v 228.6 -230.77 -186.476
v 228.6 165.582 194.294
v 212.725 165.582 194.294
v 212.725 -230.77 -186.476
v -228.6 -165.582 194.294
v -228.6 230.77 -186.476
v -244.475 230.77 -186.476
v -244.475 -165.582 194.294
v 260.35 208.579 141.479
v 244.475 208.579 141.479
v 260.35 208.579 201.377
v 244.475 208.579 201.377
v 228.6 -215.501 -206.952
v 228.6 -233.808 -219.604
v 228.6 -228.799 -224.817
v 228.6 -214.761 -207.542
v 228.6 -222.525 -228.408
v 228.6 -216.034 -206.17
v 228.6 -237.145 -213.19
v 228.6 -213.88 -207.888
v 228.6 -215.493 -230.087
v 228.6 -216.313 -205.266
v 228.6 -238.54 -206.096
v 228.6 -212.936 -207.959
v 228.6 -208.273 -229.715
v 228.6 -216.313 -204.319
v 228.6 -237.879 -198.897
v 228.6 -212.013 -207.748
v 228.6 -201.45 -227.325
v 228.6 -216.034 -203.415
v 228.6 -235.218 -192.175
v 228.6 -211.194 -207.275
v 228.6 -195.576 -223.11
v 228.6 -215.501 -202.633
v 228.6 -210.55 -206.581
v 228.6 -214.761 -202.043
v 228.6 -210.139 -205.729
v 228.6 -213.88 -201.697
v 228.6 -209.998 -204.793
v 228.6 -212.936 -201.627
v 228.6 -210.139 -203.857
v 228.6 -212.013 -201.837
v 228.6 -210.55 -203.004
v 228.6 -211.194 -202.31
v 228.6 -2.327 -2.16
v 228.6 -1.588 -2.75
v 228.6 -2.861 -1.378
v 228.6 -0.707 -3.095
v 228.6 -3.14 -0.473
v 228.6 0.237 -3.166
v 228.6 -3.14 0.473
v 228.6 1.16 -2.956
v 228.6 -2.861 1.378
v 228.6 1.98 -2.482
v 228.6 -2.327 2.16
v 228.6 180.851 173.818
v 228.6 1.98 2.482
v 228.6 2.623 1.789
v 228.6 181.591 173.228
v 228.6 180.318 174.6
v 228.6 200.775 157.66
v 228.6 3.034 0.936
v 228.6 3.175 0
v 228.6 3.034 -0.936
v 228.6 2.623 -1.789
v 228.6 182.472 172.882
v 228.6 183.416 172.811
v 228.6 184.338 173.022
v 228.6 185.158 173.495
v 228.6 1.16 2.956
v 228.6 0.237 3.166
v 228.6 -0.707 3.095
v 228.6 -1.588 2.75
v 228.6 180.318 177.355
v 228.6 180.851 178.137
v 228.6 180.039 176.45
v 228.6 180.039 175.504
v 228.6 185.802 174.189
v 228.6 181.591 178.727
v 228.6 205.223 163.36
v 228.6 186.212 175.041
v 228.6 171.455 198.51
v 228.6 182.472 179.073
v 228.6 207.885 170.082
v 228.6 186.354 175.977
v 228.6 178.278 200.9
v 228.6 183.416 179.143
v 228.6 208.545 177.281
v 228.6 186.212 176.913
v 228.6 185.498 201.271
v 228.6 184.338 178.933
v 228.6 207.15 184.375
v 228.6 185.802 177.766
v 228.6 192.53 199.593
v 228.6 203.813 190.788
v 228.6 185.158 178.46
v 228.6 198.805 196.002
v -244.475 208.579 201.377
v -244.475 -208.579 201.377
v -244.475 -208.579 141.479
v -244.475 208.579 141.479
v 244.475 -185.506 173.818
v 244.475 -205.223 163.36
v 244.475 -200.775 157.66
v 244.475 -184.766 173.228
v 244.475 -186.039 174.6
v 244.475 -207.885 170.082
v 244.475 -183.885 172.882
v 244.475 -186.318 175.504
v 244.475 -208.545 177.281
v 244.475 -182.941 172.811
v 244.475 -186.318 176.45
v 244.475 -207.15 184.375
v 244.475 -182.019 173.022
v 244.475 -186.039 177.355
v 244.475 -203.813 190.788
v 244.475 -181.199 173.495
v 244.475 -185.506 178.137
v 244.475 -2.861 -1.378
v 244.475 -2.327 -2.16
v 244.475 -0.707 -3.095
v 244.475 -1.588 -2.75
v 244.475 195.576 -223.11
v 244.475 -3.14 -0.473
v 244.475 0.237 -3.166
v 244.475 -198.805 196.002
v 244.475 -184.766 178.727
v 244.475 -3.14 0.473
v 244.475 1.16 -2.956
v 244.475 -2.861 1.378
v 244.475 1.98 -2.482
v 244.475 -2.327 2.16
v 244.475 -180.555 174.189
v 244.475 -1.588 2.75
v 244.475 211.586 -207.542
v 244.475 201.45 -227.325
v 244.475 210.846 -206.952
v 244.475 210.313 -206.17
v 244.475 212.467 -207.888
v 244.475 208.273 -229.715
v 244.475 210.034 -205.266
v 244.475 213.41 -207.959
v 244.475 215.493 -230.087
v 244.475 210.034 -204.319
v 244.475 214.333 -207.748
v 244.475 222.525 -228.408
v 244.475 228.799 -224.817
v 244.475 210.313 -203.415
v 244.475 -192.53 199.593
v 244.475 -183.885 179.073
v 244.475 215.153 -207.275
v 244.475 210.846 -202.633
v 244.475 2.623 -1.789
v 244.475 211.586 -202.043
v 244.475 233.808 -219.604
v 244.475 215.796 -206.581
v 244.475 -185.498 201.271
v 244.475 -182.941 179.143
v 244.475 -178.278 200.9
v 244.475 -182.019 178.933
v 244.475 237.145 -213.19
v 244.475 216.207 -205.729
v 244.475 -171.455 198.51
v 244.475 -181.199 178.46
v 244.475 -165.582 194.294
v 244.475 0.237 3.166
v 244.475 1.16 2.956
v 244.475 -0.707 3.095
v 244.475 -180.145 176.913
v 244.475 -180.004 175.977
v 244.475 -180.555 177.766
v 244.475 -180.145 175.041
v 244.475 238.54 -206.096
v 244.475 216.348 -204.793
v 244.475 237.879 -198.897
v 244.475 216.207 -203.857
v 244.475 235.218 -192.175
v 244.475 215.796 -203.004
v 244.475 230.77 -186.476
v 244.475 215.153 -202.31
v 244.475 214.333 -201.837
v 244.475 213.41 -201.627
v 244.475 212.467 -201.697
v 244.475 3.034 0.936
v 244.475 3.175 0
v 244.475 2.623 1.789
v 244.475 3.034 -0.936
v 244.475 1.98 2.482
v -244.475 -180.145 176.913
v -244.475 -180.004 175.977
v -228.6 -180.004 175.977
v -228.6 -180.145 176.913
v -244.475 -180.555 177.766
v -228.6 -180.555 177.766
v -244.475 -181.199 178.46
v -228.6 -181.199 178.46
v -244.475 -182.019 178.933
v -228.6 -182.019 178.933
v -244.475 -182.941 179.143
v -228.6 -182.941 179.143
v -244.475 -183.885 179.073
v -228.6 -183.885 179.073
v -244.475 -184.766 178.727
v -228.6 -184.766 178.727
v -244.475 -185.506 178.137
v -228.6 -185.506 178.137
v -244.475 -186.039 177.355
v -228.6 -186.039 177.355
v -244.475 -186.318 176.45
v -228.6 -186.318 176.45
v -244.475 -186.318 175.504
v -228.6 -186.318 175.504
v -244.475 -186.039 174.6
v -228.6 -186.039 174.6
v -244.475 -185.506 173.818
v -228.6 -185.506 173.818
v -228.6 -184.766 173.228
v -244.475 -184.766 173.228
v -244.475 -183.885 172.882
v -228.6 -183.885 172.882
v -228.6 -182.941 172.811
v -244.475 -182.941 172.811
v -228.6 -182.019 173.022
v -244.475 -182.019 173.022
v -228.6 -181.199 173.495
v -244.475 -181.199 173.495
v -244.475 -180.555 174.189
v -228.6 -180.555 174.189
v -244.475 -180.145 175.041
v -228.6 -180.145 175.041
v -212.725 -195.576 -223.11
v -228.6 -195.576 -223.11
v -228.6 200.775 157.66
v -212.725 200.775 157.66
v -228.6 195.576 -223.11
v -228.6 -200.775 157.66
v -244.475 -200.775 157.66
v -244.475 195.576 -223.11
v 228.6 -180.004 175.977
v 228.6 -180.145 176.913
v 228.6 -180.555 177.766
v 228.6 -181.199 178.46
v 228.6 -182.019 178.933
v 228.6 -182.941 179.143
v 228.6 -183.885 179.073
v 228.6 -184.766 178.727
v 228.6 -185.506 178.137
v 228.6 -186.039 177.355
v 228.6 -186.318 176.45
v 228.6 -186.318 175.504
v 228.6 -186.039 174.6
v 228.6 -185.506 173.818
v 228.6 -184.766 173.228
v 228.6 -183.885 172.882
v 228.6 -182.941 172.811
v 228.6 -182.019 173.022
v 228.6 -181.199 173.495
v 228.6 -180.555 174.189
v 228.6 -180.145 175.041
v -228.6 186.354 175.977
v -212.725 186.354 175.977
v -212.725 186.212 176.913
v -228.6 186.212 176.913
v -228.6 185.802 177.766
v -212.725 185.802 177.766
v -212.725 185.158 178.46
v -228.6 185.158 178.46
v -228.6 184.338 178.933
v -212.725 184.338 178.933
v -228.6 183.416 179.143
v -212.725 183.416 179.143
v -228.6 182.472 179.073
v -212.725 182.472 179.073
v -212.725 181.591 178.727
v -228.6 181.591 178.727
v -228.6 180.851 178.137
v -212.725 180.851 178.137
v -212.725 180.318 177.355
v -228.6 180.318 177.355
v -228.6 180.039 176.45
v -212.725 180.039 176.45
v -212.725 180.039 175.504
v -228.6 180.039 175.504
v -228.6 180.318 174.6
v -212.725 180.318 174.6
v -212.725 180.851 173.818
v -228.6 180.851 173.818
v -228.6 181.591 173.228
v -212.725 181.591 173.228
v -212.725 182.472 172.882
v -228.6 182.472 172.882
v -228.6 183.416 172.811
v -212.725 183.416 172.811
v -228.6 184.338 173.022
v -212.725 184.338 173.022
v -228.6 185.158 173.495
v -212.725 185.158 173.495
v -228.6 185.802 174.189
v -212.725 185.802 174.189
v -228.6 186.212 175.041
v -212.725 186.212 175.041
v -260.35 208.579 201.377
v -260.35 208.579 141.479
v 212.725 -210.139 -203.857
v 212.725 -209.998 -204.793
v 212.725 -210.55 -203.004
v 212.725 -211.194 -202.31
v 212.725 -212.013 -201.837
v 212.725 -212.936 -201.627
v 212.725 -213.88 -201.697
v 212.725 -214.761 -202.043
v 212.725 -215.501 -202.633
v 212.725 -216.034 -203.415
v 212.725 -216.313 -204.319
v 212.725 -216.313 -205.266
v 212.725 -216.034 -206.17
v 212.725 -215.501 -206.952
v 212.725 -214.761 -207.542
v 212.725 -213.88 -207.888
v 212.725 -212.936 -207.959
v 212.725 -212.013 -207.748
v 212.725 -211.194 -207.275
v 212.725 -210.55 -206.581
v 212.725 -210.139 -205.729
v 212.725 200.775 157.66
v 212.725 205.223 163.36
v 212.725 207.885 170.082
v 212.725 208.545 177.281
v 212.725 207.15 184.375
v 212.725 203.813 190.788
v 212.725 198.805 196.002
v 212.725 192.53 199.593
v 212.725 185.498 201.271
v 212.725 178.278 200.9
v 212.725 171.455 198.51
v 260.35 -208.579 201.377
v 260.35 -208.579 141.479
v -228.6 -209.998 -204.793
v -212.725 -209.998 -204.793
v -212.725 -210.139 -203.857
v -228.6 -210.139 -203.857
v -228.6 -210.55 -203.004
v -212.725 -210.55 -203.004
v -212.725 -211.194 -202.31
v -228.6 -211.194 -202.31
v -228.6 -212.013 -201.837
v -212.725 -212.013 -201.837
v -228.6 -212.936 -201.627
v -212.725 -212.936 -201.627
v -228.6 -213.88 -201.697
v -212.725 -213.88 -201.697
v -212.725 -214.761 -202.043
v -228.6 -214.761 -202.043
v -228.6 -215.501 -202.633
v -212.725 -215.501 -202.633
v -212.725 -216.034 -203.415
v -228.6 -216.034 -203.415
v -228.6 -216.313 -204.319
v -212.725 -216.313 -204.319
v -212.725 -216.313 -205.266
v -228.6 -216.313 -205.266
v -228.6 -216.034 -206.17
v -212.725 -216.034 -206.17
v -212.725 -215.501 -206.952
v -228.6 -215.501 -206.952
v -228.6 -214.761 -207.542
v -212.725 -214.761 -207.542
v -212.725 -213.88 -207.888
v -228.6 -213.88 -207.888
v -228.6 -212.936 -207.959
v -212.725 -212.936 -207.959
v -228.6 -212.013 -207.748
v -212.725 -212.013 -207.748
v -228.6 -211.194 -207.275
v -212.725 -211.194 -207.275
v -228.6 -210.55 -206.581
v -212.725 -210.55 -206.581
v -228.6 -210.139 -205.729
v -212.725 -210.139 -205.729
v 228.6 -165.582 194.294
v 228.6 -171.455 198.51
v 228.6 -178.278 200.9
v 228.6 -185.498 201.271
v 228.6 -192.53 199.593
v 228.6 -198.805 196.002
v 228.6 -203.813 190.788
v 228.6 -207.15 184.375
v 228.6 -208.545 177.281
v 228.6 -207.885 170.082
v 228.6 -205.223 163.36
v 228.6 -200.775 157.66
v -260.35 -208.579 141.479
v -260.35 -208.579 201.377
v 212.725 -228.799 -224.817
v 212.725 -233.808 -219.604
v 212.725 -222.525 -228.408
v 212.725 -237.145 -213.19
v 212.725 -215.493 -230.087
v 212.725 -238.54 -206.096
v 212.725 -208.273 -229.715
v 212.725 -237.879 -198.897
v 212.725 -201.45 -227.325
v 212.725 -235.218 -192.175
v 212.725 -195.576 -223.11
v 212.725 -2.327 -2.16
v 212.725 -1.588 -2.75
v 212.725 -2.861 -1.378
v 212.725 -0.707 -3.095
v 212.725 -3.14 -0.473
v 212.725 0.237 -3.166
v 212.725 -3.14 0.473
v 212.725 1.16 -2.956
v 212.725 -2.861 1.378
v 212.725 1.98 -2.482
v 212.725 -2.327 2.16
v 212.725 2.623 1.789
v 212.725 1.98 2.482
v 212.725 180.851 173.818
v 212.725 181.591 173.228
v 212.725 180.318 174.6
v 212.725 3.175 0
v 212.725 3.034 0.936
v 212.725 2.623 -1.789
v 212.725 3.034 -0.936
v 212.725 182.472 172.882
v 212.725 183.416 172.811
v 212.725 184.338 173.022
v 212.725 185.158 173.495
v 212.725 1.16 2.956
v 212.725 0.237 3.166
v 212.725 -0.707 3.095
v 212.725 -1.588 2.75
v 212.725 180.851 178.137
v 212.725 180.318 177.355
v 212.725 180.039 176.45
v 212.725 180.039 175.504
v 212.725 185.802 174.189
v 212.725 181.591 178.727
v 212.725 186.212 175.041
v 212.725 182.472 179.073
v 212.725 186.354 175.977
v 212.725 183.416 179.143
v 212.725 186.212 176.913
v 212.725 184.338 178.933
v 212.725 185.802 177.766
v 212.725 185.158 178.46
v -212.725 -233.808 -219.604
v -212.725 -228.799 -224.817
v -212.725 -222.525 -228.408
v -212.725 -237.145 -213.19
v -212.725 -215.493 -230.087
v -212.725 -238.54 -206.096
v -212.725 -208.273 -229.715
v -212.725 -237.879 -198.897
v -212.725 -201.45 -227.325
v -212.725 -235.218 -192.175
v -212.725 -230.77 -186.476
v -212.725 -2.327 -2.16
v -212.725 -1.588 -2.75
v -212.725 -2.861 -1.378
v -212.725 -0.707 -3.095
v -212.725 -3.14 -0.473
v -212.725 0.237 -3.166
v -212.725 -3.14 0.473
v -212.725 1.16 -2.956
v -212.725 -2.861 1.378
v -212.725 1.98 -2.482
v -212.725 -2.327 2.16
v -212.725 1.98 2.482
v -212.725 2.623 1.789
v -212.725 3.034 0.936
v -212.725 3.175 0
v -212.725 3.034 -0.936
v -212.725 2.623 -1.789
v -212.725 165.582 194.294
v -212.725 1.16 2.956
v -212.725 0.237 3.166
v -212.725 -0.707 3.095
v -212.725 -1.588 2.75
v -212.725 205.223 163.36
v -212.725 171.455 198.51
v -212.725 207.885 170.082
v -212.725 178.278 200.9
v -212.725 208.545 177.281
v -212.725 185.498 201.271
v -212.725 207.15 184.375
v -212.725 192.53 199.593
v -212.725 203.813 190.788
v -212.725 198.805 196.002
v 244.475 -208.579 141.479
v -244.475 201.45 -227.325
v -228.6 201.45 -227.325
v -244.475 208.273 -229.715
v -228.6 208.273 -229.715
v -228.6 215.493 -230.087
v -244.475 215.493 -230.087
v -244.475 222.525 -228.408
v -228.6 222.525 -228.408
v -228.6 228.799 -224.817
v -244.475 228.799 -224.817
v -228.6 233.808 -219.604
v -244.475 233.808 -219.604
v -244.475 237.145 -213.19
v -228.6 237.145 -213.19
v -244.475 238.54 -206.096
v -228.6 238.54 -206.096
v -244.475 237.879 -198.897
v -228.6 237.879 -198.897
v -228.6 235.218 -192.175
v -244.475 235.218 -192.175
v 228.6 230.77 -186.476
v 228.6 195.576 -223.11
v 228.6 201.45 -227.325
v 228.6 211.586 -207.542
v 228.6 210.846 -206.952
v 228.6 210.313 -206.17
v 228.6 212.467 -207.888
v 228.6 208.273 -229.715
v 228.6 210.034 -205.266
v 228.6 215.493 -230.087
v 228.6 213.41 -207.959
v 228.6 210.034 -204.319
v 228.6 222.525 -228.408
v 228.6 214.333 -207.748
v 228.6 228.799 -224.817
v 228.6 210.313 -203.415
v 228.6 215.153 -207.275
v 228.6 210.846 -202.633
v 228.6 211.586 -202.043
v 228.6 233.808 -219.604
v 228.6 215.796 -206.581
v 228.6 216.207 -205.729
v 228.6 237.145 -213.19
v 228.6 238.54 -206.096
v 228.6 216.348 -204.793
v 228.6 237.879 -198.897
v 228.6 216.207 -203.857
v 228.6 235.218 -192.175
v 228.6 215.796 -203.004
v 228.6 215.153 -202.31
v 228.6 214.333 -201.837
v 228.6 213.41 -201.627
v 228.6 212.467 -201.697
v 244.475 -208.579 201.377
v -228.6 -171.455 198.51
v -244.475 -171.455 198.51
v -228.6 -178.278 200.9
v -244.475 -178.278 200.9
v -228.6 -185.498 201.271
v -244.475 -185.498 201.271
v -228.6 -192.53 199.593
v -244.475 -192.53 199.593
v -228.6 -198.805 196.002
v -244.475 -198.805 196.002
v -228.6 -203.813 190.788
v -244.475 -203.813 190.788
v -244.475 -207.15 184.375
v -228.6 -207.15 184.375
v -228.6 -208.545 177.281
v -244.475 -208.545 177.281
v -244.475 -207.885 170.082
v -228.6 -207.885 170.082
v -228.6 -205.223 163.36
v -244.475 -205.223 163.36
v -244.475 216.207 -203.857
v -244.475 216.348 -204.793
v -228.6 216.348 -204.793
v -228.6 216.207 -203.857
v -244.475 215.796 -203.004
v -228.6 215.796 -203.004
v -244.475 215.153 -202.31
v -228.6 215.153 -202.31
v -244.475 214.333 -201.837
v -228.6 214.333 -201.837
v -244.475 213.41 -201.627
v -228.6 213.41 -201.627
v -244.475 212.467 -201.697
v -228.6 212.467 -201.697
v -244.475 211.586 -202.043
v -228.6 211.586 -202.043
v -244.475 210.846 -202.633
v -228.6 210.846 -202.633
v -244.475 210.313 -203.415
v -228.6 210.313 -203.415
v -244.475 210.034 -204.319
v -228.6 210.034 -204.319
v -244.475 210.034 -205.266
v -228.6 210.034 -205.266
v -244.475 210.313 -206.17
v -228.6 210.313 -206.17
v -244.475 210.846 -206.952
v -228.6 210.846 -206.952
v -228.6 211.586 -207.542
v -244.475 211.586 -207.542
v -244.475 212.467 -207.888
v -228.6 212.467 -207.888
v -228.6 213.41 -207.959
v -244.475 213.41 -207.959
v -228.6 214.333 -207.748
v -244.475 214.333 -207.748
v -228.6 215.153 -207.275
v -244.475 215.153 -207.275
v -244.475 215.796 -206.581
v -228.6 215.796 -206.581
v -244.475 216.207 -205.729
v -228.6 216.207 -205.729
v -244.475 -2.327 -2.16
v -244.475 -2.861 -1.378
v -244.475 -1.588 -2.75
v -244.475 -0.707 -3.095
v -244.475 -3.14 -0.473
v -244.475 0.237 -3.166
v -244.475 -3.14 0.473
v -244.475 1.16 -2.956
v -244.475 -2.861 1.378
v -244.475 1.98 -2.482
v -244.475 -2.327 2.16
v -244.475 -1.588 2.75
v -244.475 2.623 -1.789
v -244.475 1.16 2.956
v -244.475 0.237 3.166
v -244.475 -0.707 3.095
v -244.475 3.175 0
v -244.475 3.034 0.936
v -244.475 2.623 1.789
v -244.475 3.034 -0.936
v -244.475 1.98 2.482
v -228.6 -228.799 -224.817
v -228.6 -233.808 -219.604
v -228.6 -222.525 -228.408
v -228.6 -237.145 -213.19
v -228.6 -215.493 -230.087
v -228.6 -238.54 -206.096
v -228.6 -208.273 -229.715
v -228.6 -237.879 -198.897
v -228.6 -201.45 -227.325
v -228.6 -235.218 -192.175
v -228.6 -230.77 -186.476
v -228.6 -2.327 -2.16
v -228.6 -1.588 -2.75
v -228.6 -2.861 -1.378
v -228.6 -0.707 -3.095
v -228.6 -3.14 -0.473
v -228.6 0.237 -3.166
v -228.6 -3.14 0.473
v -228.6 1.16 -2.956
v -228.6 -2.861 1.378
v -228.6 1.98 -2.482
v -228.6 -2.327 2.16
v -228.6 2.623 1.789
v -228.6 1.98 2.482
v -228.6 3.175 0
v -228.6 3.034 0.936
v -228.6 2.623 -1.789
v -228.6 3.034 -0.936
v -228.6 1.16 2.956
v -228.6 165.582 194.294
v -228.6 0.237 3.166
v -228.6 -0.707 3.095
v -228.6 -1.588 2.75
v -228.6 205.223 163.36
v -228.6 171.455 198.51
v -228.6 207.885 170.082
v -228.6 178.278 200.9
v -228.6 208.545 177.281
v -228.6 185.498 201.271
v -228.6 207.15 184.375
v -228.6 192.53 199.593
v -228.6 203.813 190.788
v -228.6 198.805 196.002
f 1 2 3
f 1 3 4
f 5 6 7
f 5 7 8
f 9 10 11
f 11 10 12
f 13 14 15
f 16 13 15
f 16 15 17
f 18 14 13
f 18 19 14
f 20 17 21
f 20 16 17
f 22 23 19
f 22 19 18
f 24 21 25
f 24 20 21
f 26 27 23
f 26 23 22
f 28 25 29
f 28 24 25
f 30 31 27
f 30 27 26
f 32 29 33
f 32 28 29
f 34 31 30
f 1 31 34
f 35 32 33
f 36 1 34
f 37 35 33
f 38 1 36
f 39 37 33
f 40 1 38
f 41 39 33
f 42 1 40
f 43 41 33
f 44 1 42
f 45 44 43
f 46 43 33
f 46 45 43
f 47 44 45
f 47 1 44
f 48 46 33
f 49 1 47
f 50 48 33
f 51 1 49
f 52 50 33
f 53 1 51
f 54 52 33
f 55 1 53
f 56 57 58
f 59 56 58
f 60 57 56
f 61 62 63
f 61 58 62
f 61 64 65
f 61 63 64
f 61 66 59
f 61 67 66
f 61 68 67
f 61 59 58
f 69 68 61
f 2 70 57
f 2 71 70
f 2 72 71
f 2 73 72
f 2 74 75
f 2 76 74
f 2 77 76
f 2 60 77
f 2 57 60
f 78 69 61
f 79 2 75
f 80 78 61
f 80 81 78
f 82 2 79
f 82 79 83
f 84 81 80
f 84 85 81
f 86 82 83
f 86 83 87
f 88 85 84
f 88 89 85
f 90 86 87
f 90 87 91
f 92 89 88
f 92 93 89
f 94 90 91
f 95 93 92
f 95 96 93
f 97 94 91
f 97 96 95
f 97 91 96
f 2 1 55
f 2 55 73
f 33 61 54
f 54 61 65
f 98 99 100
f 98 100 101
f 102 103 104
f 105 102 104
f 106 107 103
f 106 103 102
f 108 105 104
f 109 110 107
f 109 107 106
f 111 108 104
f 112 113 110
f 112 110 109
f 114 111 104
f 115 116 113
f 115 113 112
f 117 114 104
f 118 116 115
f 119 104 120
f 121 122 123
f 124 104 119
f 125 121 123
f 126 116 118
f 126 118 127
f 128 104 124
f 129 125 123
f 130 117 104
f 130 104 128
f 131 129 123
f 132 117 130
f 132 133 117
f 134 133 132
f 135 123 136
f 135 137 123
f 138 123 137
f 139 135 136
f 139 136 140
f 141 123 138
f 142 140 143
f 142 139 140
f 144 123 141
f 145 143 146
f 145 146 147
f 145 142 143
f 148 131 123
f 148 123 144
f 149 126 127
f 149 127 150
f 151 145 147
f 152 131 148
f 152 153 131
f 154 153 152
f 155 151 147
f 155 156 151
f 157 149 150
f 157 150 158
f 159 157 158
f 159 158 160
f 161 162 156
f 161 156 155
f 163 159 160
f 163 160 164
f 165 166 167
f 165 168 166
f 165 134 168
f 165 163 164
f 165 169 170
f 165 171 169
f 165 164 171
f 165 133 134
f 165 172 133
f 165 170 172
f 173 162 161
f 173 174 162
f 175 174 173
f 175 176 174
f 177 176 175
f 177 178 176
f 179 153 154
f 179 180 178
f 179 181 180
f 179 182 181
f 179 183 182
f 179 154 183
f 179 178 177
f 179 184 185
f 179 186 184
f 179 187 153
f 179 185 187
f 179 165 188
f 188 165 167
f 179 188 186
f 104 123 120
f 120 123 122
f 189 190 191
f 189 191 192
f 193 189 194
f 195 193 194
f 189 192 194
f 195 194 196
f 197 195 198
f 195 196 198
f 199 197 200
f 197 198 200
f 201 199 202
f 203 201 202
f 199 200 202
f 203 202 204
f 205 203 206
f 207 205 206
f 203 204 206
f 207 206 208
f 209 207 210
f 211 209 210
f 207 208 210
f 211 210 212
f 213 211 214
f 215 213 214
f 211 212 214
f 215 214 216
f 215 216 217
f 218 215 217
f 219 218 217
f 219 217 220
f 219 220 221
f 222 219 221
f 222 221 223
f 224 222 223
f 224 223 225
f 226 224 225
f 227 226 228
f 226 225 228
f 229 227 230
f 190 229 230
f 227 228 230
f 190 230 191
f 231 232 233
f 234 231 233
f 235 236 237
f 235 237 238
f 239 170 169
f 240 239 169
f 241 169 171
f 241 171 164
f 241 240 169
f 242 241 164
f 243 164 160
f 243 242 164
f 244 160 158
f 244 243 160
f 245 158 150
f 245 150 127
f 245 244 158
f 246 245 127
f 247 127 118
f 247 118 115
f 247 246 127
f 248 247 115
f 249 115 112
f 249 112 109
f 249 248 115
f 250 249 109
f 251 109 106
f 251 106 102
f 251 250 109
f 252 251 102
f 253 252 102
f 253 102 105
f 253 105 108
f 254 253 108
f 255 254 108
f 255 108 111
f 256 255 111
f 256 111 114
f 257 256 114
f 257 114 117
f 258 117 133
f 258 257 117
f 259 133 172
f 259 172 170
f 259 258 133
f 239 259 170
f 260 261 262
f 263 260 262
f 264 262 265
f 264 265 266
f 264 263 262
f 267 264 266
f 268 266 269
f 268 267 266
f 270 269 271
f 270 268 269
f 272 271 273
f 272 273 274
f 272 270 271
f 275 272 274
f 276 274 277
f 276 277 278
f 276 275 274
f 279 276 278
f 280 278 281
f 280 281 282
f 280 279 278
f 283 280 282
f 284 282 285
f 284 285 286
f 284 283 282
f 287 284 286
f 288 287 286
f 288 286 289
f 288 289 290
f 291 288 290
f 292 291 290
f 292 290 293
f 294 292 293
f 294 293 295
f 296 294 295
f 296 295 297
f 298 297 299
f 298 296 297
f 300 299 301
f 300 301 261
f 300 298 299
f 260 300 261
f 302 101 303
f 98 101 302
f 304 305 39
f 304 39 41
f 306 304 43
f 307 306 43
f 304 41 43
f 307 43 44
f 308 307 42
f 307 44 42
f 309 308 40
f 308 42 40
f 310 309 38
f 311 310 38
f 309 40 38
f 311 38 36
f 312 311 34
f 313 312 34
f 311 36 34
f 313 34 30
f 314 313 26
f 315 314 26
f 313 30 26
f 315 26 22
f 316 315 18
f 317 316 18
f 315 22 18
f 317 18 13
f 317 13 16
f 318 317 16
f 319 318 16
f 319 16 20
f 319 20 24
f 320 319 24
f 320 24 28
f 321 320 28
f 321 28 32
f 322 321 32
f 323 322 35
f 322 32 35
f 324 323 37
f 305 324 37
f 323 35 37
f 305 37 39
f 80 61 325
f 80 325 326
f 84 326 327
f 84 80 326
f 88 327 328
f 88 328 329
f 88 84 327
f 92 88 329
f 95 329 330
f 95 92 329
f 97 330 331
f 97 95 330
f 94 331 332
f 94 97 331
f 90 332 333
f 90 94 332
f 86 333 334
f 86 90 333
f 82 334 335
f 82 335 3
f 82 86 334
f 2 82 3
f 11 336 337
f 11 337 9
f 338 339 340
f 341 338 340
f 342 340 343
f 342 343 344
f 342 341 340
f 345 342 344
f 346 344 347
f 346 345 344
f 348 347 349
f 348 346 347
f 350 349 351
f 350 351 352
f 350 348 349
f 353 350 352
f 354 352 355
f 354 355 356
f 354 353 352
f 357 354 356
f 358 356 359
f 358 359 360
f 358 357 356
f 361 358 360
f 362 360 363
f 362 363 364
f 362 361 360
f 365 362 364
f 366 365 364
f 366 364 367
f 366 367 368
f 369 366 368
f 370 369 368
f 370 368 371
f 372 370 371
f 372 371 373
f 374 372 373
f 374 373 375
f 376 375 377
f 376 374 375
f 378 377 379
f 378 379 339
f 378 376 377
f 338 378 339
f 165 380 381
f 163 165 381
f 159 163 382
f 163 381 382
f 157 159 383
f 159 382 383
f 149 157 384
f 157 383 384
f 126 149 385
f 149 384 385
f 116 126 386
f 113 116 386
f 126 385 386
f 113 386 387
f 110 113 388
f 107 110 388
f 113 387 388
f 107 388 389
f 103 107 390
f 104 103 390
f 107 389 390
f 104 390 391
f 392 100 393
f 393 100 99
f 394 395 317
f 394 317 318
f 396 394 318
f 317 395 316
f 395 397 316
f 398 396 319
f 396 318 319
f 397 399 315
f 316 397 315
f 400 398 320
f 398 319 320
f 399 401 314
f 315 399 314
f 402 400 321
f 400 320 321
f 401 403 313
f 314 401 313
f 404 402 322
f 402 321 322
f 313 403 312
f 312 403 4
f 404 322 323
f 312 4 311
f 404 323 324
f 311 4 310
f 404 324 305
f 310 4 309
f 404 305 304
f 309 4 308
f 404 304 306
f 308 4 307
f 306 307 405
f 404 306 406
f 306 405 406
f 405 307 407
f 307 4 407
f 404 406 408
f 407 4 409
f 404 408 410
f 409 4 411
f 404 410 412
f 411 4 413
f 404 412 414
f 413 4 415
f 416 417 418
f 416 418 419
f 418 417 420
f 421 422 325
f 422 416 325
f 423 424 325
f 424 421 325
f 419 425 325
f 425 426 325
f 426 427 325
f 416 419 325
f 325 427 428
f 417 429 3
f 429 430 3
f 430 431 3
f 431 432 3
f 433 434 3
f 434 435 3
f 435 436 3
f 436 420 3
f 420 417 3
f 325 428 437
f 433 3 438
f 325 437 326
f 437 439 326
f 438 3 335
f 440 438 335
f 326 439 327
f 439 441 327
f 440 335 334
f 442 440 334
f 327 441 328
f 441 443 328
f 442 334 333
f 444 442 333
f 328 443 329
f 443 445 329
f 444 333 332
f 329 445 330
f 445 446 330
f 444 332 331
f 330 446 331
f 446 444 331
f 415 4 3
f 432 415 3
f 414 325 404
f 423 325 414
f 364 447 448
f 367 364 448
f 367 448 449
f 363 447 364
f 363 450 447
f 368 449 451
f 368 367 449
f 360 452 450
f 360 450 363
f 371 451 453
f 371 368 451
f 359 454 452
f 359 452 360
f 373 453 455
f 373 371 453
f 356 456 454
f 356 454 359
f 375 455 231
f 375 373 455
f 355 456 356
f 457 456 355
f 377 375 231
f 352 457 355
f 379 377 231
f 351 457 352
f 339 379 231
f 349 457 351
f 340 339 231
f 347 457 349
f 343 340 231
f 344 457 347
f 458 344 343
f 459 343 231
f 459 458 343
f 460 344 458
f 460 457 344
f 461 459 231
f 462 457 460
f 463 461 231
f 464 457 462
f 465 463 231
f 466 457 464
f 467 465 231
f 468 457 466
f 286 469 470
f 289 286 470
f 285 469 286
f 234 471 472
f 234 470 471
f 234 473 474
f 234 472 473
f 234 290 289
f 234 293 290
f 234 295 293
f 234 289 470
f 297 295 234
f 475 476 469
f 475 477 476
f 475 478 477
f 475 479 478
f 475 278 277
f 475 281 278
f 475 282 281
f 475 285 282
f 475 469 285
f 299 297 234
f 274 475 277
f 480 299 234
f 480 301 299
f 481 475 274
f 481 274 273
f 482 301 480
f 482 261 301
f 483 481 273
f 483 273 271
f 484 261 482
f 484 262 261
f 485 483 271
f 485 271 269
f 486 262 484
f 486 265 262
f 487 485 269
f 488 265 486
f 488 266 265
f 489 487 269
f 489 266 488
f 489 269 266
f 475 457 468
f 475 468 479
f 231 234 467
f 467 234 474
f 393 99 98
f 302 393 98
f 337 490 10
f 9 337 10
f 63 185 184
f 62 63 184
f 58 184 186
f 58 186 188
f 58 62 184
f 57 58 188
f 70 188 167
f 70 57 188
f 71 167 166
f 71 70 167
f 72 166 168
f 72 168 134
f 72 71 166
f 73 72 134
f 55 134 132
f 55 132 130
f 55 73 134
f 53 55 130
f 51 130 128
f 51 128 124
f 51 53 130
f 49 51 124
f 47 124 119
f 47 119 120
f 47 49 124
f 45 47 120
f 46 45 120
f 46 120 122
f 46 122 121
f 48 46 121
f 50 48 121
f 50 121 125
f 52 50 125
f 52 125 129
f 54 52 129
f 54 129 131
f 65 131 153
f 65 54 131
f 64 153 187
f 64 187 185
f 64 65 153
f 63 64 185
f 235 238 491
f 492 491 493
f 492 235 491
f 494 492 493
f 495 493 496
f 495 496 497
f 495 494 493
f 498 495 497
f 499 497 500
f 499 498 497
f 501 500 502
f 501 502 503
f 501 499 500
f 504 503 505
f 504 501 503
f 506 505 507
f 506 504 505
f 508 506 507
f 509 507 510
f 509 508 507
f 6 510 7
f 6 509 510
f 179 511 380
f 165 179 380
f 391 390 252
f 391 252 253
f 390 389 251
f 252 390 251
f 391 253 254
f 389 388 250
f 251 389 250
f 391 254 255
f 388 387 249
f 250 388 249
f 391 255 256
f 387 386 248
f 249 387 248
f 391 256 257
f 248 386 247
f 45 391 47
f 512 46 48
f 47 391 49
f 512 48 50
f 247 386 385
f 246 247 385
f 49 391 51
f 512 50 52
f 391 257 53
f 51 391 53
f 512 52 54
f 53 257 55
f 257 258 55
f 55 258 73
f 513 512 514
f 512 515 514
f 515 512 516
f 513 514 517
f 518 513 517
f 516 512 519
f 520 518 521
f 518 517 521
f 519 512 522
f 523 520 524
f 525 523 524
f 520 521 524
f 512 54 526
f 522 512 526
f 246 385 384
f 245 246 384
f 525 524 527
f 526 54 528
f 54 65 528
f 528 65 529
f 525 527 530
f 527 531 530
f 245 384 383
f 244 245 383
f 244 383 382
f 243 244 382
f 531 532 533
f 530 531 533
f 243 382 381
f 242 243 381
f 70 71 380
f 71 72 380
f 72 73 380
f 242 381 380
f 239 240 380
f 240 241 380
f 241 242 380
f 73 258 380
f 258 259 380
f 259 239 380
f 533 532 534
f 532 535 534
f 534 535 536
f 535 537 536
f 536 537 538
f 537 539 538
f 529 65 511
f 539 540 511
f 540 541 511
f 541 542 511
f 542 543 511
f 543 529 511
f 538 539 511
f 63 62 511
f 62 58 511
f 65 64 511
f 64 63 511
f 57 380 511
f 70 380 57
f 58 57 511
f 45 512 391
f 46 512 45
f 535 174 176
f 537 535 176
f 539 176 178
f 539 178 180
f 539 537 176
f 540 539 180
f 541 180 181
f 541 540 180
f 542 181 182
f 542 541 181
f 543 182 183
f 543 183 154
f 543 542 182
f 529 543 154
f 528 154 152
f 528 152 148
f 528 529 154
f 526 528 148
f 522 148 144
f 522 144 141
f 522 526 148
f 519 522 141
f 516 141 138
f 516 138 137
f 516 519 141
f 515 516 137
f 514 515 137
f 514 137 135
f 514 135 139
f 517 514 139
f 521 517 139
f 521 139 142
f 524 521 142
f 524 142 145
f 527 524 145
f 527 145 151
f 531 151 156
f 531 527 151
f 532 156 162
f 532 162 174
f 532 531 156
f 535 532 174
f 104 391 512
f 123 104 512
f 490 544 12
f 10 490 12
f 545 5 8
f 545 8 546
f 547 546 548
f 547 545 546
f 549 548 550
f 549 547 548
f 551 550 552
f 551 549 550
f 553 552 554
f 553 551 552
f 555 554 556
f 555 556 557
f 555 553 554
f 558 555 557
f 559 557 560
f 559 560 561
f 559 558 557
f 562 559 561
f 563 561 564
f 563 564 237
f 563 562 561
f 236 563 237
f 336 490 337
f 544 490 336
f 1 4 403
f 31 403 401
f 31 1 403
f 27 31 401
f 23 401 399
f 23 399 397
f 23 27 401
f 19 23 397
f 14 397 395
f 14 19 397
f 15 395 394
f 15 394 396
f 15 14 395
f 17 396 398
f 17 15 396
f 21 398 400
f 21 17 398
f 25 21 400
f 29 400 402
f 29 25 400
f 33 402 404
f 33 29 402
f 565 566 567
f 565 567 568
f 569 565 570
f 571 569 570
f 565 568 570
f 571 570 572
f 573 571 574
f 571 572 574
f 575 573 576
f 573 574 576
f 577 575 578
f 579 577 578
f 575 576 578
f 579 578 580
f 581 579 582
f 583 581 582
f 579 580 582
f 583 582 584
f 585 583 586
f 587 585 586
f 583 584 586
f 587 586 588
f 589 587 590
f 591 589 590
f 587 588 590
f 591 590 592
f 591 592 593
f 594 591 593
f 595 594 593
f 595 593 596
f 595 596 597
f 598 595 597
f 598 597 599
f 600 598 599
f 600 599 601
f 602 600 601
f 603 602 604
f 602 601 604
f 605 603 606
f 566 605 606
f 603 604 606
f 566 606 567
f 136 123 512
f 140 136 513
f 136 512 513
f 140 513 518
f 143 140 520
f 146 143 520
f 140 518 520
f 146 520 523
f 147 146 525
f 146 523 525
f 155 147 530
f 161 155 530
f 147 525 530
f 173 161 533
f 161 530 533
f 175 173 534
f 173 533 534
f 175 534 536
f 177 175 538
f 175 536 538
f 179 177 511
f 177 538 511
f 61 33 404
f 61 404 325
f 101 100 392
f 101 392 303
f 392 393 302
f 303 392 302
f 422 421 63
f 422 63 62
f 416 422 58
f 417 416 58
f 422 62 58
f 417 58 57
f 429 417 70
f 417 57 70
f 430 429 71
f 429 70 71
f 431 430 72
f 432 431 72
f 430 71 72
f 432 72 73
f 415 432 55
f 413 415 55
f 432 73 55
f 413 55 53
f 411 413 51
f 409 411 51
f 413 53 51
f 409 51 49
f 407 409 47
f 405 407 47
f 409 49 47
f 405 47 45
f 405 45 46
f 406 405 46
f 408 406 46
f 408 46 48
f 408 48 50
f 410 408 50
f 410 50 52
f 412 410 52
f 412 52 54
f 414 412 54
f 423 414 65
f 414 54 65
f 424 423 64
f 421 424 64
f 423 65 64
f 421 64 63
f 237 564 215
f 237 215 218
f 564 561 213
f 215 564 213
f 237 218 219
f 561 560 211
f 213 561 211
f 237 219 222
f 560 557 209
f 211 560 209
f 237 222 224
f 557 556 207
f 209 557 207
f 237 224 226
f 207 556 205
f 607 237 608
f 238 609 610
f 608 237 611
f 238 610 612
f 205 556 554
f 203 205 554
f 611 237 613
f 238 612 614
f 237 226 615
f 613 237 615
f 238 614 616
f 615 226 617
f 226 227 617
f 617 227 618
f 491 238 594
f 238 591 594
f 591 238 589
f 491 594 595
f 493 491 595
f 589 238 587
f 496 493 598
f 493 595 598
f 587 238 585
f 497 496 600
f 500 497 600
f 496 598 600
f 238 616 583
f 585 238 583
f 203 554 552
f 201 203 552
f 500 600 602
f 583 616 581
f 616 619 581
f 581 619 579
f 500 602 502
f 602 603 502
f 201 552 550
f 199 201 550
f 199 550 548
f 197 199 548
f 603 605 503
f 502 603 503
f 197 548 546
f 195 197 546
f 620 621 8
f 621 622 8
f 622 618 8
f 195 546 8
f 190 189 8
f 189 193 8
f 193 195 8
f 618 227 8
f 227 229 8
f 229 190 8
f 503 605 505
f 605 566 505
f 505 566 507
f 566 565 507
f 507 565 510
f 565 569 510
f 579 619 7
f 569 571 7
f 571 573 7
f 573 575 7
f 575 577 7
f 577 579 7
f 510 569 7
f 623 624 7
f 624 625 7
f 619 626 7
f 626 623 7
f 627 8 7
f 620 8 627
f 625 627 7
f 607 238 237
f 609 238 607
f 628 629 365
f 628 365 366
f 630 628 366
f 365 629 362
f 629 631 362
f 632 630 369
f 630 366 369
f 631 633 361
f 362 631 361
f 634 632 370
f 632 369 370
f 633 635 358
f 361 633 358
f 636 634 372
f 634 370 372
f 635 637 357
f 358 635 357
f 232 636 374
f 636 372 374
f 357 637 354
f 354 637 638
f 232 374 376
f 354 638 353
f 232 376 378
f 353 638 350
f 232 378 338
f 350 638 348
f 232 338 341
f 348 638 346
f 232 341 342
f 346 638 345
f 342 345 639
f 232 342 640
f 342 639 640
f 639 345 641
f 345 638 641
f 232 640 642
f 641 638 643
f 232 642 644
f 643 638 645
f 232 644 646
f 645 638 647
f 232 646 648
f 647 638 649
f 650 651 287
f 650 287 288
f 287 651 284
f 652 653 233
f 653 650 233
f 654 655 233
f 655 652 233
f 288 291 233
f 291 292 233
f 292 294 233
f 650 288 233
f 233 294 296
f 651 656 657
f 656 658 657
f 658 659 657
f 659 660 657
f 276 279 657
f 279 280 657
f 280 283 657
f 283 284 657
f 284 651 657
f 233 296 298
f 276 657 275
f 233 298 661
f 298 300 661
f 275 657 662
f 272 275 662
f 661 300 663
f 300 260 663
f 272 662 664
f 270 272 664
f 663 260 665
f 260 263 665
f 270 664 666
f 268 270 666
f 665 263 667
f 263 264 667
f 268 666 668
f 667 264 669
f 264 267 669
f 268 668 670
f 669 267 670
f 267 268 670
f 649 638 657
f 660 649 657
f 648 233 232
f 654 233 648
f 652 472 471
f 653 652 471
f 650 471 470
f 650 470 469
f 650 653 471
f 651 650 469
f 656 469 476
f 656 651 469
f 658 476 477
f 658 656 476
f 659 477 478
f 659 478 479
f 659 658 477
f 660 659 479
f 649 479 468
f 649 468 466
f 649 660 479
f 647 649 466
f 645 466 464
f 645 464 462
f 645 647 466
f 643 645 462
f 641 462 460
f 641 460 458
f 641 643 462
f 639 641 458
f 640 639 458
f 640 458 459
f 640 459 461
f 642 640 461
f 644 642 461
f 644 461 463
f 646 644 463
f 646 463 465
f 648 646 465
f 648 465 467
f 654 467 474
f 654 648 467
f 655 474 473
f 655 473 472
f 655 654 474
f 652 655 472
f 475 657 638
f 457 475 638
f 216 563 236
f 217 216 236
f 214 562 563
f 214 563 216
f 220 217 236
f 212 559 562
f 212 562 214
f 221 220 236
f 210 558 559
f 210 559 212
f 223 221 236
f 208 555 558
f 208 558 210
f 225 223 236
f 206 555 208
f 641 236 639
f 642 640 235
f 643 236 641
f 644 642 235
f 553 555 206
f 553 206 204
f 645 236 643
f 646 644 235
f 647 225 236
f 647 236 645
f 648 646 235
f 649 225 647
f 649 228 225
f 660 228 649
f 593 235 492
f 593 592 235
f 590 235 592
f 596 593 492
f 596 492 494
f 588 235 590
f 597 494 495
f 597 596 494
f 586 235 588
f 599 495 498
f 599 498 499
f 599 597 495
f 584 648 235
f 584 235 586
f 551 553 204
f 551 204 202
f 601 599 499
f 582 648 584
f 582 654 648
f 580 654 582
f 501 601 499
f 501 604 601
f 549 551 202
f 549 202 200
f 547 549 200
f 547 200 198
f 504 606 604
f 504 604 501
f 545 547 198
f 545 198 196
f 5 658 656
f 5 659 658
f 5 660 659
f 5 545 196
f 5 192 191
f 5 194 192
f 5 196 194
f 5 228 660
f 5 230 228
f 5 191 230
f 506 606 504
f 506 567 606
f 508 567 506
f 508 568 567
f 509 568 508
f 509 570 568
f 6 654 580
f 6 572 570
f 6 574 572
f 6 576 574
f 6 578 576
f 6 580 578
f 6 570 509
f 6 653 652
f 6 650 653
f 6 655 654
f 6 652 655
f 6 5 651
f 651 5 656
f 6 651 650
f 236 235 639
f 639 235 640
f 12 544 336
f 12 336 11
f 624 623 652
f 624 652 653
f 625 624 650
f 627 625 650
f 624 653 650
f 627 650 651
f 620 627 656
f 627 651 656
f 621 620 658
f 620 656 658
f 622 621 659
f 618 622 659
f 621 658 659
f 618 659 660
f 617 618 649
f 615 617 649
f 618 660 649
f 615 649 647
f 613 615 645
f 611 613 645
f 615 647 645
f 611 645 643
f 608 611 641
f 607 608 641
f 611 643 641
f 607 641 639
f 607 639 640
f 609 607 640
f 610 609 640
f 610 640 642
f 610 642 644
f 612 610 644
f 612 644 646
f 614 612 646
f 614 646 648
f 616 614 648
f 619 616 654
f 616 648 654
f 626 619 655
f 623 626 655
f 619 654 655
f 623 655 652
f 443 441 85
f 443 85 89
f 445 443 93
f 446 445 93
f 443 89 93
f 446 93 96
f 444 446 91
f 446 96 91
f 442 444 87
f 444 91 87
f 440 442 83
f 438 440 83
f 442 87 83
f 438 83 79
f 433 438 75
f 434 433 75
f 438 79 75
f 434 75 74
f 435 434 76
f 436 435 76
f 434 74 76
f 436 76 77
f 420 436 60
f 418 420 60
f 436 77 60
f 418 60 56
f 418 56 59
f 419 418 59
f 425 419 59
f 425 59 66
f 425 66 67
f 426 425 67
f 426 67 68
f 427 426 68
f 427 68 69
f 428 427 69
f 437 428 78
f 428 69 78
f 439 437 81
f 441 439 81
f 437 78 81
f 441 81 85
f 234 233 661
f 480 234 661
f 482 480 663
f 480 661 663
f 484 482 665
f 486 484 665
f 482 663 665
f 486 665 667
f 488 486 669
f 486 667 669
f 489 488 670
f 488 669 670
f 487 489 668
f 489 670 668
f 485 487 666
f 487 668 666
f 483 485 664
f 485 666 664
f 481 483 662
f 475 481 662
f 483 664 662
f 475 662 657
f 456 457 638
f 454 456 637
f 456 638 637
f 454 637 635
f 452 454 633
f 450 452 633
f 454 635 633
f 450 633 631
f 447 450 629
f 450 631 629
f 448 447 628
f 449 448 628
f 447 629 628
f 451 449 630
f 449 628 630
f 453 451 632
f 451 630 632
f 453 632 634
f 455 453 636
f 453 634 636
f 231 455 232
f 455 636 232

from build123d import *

# Parameters (mm, degrees)
F2_R     = 3.175
F3_DEPTH = 15.875
F4_DEPTH = 15.875
F5_W     = 417.1570104862
F5_H     = 59.898608482
F6_DEPTH = 15.875


# Not quite as in the source:
# - a length typed as a fraction of an inch, garbled in the dataset ("3 / 203.2 mm" for 3/8 in), is restored


with BuildPart() as f3:
    # F2 (on line) → F3 (new body)
    with BuildSketch(Plane.YZ.offset(228.6)):
        with BuildLine():
            Line((36.6633615893, 0), (0, -35.2220263714))
            Line((0, -35.2220263714), (195.5762402522, -223.1096393228))
            ThreePointArc((195.5762402522, -223.1096393228), (231.4900464095, -222.3895509281), (230.7699580147, -186.4757447708))
            Line((230.7699580147, -186.4757447708), (36.6633615893, 0))
        make_face()
        with Locations((213.1730991335, -204.7926920468)):
            Circle(F2_R, mode=Mode.SUBTRACT)
        with BuildLine():
            Line((-200.7753641244, 157.6603189284), (-36.6633615893, 0))
            Line((-36.6633615893, 0), (0, 35.2220263714))
            Line((0, 35.2220263714), (-165.5816463618, 194.2942134805))
            ThreePointArc((-165.5816463618, 194.2942134805), (-201.4954525191, 193.5741250857), (-200.7753641244, 157.6603189284))
        make_face()
        with Locations((-183.1785052431, 175.9772662045)):
            Circle(F2_R, mode=Mode.SUBTRACT)
        Polygon((0, 35.2220263714), (-36.6633615893, 0), (0, -35.2220263714), (36.6633615893, 0), align=None)
        Circle(F2_R, mode=Mode.SUBTRACT)
    extrude(amount=F3_DEPTH)


with BuildPart() as f4:
    # F2 (on line) → F4 (new body)
    with BuildSketch(Plane.YZ.offset(228.6)):
        with BuildLine():
            Line((165.5816463618, 194.2942134805), (0, 35.2220263714))
            Line((0, 35.2220263714), (36.6633615893, 0))
            Line((36.6633615893, 0), (200.7753641244, 157.6603189284))
            ThreePointArc((200.7753641244, 157.6603189284), (201.4954525191, 193.5741250857), (165.5816463618, 194.2942134805))
        make_face()
        with Locations((183.1785052431, 175.9772662045)):
            Circle(F2_R, mode=Mode.SUBTRACT)
        Polygon((0, 35.2220263714), (-36.6633615893, 0), (0, -35.2220263714), (36.6633615893, 0), align=None)
        Circle(F2_R, mode=Mode.SUBTRACT)
        with BuildLine():
            Line((-36.6633615893, 0), (-230.7699580147, -186.4757447708))
            ThreePointArc((-230.7699580147, -186.4757447708), (-231.4900464095, -222.3895509281), (-195.5762402522, -223.1096393228))
            Line((-195.5762402522, -223.1096393228), (0, -35.2220263714))
            Line((0, -35.2220263714), (-36.6633615893, 0))
        make_face()
        with Locations((-213.1730991335, -204.7926920468)):
            Circle(F2_R, mode=Mode.SUBTRACT)
    extrude(amount=-F4_DEPTH)


with BuildPart() as f6:
    # F5 (on face) → F6 (new body)
    with BuildSketch(Plane.YZ.offset(244.475)):
        with Locations((0, 171.4279619635)):
            Rectangle(F5_W, F5_H)
    extrude(amount=F6_DEPTH)


with BuildPart() as f7_1:
    # F7: instance of F4
    add(f4.part.mirror(Plane.YZ))


with BuildPart() as f7_2:
    # F7: instance of F3
    add(f3.part.mirror(Plane.YZ))


with BuildPart() as f7_3:
    # F7: instance of F6
    add(f6.part.mirror(Plane.YZ))


solid = Compound([f3.part, f4.part, f6.part, f7_1.part, f7_2.part, f7_3.part])
